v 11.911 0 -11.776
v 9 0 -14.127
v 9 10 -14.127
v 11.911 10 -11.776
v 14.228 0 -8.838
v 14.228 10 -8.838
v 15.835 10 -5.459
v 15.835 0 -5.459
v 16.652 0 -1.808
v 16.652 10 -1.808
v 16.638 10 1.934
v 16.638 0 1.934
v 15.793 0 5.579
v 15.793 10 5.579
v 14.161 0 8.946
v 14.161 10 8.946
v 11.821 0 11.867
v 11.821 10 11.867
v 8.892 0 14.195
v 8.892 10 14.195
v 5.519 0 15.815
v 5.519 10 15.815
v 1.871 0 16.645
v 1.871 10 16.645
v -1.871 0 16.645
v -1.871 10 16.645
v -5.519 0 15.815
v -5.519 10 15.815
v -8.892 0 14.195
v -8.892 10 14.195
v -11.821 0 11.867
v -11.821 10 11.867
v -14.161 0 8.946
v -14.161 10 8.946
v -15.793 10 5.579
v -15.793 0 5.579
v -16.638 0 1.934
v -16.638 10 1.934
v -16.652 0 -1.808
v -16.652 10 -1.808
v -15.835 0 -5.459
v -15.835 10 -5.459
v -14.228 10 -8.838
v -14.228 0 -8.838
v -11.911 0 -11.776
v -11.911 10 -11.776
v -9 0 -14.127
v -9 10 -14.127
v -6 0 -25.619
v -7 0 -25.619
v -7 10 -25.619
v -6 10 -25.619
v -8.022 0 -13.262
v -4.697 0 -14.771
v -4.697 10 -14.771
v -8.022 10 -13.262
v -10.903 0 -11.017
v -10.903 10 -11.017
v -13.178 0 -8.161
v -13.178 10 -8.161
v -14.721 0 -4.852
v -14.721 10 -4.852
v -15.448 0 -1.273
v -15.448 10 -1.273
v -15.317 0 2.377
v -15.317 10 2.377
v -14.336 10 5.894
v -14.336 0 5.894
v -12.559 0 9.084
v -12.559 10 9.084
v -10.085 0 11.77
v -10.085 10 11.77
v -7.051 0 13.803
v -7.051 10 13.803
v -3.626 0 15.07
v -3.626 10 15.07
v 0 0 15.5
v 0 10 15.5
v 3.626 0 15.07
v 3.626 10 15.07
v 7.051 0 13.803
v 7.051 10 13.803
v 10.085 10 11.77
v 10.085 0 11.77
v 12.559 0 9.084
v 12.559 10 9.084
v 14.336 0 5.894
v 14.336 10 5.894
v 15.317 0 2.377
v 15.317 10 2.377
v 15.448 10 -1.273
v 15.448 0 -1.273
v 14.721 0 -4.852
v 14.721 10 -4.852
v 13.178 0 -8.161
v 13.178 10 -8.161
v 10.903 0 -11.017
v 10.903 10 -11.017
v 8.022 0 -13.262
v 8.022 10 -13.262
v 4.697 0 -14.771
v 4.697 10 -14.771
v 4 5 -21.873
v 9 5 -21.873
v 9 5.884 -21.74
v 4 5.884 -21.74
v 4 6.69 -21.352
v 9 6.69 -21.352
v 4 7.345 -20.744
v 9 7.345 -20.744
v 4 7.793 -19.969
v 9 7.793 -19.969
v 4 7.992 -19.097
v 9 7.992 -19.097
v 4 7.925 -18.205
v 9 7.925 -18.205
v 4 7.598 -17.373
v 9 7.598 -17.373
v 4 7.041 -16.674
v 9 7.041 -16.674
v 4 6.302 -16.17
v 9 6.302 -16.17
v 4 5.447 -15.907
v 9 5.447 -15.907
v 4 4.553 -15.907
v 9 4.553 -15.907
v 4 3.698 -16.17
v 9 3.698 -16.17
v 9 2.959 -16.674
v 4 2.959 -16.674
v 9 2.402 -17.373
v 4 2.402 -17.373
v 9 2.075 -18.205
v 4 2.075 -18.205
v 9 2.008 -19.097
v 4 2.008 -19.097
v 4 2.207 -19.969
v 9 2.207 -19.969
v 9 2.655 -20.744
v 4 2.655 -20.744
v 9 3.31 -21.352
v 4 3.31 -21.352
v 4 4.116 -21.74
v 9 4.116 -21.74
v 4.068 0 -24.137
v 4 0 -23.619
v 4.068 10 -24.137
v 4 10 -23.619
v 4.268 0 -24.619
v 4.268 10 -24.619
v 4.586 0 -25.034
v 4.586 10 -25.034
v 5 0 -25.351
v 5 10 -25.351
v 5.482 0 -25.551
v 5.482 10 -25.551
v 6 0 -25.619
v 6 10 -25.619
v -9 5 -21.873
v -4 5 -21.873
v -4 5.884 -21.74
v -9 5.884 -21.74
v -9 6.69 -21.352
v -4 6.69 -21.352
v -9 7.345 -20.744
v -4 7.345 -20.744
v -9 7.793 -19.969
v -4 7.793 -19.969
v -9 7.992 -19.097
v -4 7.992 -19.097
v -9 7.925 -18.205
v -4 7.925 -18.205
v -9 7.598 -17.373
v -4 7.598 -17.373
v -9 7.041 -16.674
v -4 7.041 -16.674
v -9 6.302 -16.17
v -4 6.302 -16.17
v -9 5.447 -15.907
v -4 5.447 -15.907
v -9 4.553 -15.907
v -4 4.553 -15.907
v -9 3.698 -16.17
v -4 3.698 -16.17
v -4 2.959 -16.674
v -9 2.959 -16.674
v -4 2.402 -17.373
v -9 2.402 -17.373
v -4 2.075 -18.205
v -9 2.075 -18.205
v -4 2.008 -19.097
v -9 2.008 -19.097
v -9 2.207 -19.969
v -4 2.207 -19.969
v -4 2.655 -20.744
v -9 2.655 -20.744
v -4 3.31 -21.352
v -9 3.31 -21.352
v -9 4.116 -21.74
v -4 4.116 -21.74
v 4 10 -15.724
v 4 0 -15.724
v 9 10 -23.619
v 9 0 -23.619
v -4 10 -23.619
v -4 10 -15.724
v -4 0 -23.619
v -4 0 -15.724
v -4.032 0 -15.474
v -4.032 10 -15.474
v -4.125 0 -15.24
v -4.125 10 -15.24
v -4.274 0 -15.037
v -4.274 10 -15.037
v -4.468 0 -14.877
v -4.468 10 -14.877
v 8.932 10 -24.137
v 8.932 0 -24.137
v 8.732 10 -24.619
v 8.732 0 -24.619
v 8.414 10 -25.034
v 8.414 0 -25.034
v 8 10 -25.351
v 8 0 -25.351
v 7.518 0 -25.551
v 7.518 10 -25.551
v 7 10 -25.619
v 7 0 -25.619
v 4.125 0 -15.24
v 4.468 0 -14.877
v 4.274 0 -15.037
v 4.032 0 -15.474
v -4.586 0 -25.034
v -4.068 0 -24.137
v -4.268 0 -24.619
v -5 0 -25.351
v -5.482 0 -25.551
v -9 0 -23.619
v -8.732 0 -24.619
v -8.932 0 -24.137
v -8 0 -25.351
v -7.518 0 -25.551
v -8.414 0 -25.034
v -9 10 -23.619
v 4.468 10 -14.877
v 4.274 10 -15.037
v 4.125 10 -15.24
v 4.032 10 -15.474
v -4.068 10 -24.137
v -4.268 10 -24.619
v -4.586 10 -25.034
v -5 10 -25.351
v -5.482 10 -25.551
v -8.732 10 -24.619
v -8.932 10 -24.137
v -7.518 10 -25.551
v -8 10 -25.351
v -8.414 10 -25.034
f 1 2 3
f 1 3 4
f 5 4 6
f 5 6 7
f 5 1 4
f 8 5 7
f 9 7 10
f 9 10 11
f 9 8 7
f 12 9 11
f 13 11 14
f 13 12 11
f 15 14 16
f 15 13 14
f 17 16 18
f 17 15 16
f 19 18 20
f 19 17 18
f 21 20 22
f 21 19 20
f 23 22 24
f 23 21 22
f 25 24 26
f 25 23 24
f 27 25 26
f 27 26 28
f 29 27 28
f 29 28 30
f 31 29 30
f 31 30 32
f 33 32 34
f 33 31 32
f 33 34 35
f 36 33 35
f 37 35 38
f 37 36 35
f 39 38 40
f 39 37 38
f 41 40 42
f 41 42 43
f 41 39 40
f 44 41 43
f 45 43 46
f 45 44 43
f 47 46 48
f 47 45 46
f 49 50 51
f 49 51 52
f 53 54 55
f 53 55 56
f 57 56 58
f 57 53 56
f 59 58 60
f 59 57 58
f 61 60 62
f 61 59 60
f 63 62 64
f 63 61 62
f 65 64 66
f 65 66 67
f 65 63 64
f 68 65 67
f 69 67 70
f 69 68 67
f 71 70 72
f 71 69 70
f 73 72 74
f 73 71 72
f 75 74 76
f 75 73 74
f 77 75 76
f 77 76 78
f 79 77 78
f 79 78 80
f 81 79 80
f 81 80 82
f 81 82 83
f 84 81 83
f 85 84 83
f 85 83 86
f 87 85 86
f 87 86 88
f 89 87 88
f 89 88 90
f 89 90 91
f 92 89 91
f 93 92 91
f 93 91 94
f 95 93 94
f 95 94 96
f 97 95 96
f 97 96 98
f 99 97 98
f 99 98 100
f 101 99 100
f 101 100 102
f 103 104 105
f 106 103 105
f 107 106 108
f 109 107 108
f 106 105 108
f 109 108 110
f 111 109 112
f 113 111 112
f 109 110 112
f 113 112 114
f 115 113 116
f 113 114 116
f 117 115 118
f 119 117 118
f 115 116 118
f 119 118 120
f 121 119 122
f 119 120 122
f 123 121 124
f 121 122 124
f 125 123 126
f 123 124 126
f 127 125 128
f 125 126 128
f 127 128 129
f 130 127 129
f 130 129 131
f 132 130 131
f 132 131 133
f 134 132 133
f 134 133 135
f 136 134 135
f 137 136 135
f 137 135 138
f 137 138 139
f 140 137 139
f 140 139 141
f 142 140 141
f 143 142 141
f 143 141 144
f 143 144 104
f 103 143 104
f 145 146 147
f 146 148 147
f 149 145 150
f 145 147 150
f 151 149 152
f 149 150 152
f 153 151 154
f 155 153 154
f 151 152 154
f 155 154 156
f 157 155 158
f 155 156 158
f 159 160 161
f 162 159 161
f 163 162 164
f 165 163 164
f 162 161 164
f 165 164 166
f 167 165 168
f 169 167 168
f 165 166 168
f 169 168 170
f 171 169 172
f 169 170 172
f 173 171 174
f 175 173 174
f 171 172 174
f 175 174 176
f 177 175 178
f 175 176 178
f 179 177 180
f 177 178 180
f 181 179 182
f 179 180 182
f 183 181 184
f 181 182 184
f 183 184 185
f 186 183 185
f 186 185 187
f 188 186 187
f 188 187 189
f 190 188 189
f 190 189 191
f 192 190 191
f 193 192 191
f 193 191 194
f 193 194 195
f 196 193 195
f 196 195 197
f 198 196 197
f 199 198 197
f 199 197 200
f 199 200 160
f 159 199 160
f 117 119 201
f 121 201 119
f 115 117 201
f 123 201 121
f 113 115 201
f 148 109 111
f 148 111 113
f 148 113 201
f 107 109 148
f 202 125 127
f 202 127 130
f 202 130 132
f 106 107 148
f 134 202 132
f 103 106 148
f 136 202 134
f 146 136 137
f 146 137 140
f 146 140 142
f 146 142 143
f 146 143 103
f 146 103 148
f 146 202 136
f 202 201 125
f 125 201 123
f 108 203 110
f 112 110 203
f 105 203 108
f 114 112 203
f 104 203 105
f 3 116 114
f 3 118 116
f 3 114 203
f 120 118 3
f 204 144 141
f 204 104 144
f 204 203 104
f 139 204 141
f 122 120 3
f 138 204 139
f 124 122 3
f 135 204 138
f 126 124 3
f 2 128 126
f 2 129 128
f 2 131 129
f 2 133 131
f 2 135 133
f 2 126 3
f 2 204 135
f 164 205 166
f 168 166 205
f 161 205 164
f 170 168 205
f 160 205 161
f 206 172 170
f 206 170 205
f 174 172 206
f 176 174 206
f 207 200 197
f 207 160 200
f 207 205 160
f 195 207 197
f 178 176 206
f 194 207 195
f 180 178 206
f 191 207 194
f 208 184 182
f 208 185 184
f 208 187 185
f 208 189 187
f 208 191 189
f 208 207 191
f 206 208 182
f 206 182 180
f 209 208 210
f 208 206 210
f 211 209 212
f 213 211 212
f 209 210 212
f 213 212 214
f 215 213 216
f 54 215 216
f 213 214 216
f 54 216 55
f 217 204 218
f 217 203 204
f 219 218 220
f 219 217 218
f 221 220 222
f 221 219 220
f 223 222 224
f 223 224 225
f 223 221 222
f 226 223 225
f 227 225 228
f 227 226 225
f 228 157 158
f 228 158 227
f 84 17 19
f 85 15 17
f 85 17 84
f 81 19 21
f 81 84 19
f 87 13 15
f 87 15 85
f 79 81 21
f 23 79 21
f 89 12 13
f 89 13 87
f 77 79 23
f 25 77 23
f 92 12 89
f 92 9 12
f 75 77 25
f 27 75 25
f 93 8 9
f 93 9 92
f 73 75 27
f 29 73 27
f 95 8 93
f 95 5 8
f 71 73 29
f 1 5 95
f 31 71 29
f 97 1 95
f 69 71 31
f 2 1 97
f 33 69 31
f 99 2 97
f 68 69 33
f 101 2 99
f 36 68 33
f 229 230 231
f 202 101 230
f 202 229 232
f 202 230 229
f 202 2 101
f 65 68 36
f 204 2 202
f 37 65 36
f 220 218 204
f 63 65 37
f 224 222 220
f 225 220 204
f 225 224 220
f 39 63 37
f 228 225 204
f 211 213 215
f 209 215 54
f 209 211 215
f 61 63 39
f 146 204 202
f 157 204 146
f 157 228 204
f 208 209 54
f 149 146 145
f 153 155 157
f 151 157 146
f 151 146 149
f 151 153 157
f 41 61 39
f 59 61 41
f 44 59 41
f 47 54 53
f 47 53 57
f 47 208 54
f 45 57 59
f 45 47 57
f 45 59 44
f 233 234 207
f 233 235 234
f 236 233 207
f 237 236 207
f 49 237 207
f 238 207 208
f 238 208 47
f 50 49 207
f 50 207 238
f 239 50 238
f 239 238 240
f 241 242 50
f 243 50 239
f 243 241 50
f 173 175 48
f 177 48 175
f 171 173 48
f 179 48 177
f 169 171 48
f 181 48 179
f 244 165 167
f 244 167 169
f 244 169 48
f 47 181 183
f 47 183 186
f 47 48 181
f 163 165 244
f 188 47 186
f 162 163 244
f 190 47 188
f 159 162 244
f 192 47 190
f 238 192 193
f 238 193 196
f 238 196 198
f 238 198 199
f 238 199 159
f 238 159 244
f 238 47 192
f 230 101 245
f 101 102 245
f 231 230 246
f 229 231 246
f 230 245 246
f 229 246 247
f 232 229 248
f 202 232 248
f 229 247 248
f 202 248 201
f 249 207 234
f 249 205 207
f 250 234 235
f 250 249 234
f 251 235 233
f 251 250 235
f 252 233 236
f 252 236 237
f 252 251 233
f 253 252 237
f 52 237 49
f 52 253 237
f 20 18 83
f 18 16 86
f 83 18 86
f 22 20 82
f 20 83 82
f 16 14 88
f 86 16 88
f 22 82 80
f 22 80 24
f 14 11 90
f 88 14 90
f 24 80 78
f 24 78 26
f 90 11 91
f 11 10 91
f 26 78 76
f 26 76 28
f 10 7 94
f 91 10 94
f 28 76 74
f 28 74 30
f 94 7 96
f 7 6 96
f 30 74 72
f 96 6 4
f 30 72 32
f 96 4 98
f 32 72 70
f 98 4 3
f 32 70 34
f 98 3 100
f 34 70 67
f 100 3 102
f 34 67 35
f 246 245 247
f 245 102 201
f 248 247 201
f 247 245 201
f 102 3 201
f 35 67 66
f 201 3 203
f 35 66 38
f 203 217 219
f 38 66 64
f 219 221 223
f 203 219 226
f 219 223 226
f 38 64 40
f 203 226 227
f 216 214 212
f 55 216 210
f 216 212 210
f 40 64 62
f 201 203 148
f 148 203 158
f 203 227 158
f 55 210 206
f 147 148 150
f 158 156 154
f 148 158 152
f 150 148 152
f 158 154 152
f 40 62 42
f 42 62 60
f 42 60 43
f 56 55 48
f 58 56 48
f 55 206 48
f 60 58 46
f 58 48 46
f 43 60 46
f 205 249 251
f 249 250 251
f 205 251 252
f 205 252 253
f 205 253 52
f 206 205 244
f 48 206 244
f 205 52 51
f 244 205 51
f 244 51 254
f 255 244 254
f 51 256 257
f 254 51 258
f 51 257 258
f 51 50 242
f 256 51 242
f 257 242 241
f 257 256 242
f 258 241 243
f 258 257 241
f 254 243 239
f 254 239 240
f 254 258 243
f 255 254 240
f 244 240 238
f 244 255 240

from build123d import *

# Parameters (mm, degrees)
SALIENTE_EXTRUIR1_DEPTH = 10
REDONDEO1_R             = 1
REDONDEO2_R             = 2
CROQUIS2_R              = 3
CORTAR_EXTRUIR1_DEPTH   = 26.75


with BuildPart() as part:
    # Croquis1 → Saliente-Extruir1 (new body)
    with BuildSketch(Plane(origin=(0, 0, 0), x_dir=(1, 0, 0), z_dir=(0, 1, 0))):
        with BuildLine():
            Line((-9, 14.126659195), (-9, 25.619429464))
            Line((-9, 25.619429464), (-4, 25.619429464))
            Line((-4, 25.619429464), (-4, 14.974979132))
            ThreePointArc((-4, 14.974979132), (0, -15.5), (4, 14.974979132))
            Line((4, 14.974979132), (4, 25.619429464))
            Line((4, 25.619429464), (9, 25.619429464))
            Line((9, 25.619429464), (9, 14.126659195))
            ThreePointArc((9, 14.126659195), (0, -16.75), (-9, 14.126659195))
        make_face()
    extrude(amount=SALIENTE_EXTRUIR1_DEPTH)

    # Redondeo1
    redondeo1_edges = [part.edges().sort_by_distance(p)[0] for p in [
        (-4, 5, -14.974979132),
        (4, 5, -14.974979132),
    ]]
    fillet(redondeo1_edges, radius=REDONDEO1_R)

    # Redondeo2
    redondeo2_edges = [part.edges().sort_by_distance(p)[0] for p in [
        (-9, 5, -25.619429464),
        (-4, 5, -25.619429464),
        (4, 5, -25.619429464),
        (9, 5, -25.619429464),
    ]]
    fillet(redondeo2_edges, radius=REDONDEO2_R)

    # Croquis2 → Cortar-Extruir1 (cut, through all)
    with BuildSketch(Plane(origin=(9, 0, 0), x_dir=(0, 0, -1), z_dir=(1, 0, 0))):
        with Locations((18.873044329, 5)):
            Circle(CROQUIS2_R)
    extrude(amount=-CORTAR_EXTRUIR1_DEPTH, mode=Mode.SUBTRACT)


solid = part.part
